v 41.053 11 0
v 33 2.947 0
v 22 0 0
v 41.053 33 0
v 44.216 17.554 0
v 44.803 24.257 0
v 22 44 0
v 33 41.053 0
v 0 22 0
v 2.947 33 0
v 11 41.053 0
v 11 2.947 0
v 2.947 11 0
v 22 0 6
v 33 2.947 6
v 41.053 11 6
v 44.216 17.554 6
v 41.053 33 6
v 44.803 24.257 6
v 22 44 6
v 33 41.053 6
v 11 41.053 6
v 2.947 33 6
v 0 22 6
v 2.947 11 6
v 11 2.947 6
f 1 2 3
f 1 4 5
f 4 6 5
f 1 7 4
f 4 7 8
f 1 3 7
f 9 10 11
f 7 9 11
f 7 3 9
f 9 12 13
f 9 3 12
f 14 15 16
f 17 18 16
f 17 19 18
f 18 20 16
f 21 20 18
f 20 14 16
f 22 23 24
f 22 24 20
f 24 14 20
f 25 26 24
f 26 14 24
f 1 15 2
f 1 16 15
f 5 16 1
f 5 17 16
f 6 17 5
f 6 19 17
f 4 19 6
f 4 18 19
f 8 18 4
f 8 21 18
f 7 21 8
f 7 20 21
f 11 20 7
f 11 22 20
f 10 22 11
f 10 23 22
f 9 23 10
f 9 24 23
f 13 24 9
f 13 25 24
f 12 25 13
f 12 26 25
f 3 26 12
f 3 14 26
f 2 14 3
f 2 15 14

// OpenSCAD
$fn = 32;

// ----------------------------------------------------------------------
// Eccentric disc: step, 6 mm thick
// ----------------------------------------------------------------------

// --- parameters (mm) ---
profile_height = 6;       // extrusion height
profile_points = 13;      // points of the closed outline

profile = [[0, 22], [2.947, 11], [11, 2.947], [22, 0], [33, 2.947], [41.053, 11], [44.216, 17.554], [44.803, 24.257], [41.053, 33], [33, 41.053], [22, 44], [11, 41.053], [2.947, 33]];  // single closed polygon, 13 points, counter clockwise

// --- the one profile operation ---
linear_extrude(height = profile_height) polygon(points = profile);
